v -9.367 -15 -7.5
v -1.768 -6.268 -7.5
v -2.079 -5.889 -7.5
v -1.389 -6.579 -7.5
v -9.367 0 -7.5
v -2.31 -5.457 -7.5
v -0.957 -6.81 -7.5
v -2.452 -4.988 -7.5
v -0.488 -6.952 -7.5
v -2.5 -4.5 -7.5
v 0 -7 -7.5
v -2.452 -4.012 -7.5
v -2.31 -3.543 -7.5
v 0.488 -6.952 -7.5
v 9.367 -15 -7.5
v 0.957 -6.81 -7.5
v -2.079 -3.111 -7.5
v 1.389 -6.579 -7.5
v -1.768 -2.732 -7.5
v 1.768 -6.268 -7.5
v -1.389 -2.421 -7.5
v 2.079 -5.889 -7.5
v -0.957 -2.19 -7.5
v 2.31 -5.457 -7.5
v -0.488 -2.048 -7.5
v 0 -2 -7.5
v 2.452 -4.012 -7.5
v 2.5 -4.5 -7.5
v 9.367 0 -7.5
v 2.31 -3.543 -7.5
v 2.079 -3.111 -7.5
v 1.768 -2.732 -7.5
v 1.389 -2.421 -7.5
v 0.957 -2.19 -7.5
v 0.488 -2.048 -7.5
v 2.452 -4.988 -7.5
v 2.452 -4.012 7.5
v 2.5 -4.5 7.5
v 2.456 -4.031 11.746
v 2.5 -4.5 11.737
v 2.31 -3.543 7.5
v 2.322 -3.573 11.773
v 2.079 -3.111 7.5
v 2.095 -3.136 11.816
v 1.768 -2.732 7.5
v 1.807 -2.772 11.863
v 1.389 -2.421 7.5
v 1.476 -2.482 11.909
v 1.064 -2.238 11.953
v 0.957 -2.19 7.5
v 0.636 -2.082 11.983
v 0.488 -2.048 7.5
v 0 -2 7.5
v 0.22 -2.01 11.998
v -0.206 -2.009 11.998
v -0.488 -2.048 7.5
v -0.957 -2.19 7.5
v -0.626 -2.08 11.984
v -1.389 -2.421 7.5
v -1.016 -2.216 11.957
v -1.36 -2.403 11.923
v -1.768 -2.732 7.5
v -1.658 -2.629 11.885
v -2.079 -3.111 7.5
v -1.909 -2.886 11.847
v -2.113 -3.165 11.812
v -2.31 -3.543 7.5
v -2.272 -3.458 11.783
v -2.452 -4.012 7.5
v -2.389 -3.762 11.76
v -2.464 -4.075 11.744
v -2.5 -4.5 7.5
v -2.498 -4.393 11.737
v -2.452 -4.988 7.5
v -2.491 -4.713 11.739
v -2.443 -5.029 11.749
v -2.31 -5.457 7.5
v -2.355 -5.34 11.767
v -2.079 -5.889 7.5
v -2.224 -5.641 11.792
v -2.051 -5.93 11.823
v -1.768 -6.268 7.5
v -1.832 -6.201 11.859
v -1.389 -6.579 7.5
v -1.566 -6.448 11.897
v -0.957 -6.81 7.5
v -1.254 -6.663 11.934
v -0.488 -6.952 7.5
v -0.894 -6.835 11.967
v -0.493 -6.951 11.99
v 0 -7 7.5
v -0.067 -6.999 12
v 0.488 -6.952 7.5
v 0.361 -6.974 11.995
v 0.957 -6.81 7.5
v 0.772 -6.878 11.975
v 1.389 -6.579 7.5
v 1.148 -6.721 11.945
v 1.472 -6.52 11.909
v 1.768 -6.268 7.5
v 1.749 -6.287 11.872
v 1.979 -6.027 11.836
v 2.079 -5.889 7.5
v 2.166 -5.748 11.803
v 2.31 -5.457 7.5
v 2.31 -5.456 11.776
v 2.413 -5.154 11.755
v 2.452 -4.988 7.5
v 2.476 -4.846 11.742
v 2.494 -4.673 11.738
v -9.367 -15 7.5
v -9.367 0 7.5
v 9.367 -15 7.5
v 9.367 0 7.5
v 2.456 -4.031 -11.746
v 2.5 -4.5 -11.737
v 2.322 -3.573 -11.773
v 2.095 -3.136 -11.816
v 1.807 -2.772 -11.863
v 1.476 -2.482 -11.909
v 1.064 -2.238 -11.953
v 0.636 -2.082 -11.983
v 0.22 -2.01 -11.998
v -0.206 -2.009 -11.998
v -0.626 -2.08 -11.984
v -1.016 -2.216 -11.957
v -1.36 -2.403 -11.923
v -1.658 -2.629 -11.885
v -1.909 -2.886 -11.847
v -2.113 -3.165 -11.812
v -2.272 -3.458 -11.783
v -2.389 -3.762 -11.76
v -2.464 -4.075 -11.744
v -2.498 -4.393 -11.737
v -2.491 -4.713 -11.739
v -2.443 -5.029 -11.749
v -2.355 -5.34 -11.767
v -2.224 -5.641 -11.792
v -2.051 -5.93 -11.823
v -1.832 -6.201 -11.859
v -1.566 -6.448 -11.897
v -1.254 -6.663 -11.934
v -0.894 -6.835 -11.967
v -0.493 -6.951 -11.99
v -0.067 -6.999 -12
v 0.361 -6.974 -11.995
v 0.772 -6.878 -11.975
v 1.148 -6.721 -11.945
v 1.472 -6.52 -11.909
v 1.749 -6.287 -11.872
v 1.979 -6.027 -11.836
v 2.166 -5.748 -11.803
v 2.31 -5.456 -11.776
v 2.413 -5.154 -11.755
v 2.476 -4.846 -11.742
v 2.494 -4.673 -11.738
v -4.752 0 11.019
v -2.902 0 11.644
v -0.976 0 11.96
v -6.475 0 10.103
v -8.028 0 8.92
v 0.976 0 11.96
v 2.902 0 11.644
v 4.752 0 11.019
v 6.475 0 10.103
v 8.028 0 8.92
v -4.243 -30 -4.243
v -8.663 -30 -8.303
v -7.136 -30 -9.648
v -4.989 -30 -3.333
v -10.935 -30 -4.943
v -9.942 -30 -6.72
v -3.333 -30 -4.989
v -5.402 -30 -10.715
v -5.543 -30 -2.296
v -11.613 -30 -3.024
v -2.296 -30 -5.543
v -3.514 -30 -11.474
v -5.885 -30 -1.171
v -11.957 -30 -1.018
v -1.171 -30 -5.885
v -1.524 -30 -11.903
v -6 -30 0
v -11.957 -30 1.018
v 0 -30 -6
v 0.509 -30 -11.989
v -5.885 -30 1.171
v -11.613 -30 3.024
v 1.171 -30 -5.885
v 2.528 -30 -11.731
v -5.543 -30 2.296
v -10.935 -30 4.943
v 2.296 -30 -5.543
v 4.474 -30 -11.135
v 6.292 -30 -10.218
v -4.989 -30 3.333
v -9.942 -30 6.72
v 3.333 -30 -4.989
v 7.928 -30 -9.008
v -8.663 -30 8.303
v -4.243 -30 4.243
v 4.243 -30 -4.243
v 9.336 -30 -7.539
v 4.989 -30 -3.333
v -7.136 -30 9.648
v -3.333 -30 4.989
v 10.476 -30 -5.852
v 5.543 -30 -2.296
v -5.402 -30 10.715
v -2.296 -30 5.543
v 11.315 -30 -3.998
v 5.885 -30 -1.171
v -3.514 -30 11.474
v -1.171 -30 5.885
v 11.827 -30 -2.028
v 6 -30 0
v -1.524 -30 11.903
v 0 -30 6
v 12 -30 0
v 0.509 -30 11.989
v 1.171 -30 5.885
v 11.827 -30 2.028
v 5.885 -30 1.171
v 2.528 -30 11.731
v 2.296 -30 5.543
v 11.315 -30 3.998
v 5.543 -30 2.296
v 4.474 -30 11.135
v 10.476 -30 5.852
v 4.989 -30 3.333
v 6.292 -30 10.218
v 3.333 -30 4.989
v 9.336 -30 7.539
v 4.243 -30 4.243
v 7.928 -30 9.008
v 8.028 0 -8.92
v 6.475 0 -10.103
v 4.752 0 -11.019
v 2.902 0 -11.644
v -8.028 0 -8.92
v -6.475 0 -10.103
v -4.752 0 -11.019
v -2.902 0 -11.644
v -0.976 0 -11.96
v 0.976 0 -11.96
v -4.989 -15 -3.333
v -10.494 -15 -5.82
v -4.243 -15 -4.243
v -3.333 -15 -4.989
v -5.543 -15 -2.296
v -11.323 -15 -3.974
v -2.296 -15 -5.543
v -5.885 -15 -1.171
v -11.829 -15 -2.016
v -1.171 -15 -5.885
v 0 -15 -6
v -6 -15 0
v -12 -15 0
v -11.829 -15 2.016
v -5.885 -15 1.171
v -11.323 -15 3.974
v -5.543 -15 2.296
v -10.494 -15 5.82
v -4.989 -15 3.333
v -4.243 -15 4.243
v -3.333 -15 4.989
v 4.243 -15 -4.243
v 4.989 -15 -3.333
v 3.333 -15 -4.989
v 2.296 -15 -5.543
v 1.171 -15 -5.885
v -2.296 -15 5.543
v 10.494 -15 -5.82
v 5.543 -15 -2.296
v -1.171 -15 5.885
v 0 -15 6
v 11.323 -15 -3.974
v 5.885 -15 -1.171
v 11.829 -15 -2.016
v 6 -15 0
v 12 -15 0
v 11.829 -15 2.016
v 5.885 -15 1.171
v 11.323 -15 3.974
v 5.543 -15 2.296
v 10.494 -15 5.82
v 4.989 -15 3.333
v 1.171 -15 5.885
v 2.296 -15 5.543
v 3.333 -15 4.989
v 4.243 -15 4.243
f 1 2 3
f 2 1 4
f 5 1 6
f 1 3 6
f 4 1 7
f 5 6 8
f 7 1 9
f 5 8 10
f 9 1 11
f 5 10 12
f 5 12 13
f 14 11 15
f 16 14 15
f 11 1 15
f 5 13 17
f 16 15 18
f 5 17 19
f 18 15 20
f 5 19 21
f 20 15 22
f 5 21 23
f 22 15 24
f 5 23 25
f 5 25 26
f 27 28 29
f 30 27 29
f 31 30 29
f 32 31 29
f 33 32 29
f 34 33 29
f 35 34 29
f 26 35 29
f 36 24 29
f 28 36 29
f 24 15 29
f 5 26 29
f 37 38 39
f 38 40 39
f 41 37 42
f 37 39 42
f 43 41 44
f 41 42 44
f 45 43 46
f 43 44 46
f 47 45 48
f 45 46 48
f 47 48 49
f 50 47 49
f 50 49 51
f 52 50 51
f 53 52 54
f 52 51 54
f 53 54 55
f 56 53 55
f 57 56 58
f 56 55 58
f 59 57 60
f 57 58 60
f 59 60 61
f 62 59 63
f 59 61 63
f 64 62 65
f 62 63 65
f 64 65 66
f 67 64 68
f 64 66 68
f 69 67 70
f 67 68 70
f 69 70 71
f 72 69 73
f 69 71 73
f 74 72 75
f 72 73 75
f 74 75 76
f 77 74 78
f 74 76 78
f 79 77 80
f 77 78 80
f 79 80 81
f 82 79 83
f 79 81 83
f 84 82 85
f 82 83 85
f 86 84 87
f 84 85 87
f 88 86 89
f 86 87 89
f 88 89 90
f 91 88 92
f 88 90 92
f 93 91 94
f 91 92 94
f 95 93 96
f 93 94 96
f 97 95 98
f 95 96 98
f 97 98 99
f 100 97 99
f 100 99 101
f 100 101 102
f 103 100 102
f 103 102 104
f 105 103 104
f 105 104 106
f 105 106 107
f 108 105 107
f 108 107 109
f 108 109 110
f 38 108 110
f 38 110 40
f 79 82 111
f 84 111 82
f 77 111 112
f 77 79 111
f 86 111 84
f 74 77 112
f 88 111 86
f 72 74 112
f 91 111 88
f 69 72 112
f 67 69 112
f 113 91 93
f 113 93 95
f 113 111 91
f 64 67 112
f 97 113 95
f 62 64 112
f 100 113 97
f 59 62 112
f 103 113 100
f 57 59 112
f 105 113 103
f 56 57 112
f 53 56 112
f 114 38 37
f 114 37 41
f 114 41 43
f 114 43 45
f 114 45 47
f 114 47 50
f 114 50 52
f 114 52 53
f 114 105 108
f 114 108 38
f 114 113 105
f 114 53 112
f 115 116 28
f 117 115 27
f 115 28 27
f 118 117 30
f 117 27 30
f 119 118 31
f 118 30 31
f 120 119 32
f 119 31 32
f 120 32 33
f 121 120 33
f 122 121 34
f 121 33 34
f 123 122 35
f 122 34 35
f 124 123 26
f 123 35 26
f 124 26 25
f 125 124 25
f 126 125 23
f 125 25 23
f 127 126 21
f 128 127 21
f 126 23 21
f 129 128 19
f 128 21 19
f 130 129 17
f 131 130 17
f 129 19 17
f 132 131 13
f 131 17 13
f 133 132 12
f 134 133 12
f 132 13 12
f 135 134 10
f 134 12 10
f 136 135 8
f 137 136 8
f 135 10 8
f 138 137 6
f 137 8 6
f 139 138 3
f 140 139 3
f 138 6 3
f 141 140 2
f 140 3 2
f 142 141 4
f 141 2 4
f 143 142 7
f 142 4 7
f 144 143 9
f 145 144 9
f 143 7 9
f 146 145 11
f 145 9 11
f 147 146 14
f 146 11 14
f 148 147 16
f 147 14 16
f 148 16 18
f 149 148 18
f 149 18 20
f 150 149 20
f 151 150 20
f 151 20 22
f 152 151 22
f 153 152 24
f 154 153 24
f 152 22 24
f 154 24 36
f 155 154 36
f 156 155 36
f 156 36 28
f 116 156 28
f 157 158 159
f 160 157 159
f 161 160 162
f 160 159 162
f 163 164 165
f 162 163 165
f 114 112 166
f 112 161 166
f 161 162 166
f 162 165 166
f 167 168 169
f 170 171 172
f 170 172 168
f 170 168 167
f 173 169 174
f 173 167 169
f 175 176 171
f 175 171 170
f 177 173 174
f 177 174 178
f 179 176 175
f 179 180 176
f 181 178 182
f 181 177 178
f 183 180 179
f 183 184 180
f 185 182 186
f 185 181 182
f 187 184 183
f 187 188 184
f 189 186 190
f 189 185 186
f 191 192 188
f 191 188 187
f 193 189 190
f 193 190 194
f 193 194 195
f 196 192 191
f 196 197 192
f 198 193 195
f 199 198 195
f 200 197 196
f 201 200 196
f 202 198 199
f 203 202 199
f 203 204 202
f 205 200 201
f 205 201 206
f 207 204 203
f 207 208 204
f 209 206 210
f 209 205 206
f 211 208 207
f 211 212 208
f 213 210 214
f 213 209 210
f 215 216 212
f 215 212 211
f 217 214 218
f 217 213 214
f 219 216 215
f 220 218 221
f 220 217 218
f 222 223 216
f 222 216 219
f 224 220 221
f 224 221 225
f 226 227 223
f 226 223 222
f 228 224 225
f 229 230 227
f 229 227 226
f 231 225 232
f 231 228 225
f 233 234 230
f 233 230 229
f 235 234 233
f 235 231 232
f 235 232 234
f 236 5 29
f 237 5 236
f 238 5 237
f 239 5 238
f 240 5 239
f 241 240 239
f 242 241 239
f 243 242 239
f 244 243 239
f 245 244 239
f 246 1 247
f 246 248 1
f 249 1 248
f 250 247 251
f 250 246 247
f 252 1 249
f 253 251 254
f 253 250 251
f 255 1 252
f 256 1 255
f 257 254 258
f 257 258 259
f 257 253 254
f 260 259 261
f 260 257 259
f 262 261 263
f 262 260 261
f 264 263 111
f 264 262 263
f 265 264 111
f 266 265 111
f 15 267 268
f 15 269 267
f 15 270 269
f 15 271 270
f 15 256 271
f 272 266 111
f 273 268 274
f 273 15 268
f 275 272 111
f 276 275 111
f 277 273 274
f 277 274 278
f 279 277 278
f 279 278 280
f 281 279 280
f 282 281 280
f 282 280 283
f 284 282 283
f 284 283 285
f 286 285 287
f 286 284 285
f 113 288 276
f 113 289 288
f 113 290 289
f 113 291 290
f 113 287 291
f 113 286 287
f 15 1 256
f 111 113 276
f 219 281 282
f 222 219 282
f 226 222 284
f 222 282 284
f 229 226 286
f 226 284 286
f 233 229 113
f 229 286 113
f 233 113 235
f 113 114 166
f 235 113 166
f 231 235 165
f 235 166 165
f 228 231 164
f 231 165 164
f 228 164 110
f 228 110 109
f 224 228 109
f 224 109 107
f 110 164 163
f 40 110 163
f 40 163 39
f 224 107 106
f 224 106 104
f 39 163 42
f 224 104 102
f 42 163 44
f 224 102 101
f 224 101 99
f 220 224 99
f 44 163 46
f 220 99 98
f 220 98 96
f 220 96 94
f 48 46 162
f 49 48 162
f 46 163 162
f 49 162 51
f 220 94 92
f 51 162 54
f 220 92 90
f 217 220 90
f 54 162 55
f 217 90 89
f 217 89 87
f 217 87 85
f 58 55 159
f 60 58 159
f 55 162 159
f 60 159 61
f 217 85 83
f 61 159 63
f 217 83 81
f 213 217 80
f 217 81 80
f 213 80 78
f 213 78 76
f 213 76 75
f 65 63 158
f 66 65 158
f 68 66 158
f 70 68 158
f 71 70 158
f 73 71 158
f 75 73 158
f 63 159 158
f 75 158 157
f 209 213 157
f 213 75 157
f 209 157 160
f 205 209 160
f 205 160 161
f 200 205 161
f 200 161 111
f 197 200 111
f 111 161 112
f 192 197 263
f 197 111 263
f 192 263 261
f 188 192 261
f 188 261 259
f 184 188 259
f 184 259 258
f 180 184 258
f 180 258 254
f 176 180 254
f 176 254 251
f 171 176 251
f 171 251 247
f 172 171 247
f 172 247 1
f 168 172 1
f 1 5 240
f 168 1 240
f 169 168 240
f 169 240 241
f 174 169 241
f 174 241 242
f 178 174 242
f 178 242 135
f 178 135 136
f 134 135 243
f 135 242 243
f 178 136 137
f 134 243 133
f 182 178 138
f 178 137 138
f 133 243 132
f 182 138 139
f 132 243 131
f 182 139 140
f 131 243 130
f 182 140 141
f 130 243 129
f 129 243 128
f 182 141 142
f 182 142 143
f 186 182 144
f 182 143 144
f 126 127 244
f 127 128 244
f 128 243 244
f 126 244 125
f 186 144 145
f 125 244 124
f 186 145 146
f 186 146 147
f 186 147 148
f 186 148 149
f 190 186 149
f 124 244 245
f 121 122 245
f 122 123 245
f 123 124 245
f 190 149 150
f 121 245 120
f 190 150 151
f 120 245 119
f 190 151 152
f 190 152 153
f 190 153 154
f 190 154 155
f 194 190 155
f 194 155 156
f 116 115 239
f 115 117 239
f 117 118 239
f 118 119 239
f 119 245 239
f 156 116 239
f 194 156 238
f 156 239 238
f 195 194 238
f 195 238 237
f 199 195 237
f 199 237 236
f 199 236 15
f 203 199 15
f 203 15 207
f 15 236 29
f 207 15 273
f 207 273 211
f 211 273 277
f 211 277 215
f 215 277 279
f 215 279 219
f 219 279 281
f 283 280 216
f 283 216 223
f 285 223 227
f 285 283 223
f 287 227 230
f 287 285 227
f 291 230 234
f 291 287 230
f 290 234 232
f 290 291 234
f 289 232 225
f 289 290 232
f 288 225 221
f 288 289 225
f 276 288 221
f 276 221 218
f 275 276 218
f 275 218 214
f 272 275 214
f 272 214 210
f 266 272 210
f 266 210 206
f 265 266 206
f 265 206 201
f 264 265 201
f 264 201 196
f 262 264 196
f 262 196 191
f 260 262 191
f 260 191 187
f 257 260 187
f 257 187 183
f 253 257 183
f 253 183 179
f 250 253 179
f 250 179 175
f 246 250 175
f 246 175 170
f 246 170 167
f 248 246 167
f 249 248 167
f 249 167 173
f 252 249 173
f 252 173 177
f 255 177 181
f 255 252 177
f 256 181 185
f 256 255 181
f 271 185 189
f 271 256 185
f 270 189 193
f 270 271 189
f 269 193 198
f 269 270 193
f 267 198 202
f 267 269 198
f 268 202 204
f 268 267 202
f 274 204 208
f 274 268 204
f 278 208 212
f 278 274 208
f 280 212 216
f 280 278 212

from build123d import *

# Parameters (mm, degrees)
F0_R     = 12
F0_R_2   = 6
F1_DEPTH = 30
F2_W     = 30
F2_H     = 15
F3_DEPTH = 12.5
F4_R     = 2.5
F5_DEPTH = 12.5


with BuildPart() as f1:
    # F0 (on Front) → F1 (new body)
    with BuildSketch(Plane.XZ):
        Circle(F0_R)
        Circle(F0_R_2, mode=Mode.SUBTRACT)
    extrude(amount=F1_DEPTH)

    # F2 (on Right) → F3 (cut, symmetric)
    with BuildSketch(Plane.YZ):
        Rectangle(F2_W, F2_H)
    extrude(amount=F3_DEPTH, both=True, mode=Mode.SUBTRACT)

    # F4 (on Top) → F5 (cut, symmetric)
    with BuildSketch(Plane.XY):
        with Locations((0, -4.5)):
            Circle(F4_R)
    extrude(amount=F5_DEPTH, both=True, mode=Mode.SUBTRACT)


solid = f1.part
